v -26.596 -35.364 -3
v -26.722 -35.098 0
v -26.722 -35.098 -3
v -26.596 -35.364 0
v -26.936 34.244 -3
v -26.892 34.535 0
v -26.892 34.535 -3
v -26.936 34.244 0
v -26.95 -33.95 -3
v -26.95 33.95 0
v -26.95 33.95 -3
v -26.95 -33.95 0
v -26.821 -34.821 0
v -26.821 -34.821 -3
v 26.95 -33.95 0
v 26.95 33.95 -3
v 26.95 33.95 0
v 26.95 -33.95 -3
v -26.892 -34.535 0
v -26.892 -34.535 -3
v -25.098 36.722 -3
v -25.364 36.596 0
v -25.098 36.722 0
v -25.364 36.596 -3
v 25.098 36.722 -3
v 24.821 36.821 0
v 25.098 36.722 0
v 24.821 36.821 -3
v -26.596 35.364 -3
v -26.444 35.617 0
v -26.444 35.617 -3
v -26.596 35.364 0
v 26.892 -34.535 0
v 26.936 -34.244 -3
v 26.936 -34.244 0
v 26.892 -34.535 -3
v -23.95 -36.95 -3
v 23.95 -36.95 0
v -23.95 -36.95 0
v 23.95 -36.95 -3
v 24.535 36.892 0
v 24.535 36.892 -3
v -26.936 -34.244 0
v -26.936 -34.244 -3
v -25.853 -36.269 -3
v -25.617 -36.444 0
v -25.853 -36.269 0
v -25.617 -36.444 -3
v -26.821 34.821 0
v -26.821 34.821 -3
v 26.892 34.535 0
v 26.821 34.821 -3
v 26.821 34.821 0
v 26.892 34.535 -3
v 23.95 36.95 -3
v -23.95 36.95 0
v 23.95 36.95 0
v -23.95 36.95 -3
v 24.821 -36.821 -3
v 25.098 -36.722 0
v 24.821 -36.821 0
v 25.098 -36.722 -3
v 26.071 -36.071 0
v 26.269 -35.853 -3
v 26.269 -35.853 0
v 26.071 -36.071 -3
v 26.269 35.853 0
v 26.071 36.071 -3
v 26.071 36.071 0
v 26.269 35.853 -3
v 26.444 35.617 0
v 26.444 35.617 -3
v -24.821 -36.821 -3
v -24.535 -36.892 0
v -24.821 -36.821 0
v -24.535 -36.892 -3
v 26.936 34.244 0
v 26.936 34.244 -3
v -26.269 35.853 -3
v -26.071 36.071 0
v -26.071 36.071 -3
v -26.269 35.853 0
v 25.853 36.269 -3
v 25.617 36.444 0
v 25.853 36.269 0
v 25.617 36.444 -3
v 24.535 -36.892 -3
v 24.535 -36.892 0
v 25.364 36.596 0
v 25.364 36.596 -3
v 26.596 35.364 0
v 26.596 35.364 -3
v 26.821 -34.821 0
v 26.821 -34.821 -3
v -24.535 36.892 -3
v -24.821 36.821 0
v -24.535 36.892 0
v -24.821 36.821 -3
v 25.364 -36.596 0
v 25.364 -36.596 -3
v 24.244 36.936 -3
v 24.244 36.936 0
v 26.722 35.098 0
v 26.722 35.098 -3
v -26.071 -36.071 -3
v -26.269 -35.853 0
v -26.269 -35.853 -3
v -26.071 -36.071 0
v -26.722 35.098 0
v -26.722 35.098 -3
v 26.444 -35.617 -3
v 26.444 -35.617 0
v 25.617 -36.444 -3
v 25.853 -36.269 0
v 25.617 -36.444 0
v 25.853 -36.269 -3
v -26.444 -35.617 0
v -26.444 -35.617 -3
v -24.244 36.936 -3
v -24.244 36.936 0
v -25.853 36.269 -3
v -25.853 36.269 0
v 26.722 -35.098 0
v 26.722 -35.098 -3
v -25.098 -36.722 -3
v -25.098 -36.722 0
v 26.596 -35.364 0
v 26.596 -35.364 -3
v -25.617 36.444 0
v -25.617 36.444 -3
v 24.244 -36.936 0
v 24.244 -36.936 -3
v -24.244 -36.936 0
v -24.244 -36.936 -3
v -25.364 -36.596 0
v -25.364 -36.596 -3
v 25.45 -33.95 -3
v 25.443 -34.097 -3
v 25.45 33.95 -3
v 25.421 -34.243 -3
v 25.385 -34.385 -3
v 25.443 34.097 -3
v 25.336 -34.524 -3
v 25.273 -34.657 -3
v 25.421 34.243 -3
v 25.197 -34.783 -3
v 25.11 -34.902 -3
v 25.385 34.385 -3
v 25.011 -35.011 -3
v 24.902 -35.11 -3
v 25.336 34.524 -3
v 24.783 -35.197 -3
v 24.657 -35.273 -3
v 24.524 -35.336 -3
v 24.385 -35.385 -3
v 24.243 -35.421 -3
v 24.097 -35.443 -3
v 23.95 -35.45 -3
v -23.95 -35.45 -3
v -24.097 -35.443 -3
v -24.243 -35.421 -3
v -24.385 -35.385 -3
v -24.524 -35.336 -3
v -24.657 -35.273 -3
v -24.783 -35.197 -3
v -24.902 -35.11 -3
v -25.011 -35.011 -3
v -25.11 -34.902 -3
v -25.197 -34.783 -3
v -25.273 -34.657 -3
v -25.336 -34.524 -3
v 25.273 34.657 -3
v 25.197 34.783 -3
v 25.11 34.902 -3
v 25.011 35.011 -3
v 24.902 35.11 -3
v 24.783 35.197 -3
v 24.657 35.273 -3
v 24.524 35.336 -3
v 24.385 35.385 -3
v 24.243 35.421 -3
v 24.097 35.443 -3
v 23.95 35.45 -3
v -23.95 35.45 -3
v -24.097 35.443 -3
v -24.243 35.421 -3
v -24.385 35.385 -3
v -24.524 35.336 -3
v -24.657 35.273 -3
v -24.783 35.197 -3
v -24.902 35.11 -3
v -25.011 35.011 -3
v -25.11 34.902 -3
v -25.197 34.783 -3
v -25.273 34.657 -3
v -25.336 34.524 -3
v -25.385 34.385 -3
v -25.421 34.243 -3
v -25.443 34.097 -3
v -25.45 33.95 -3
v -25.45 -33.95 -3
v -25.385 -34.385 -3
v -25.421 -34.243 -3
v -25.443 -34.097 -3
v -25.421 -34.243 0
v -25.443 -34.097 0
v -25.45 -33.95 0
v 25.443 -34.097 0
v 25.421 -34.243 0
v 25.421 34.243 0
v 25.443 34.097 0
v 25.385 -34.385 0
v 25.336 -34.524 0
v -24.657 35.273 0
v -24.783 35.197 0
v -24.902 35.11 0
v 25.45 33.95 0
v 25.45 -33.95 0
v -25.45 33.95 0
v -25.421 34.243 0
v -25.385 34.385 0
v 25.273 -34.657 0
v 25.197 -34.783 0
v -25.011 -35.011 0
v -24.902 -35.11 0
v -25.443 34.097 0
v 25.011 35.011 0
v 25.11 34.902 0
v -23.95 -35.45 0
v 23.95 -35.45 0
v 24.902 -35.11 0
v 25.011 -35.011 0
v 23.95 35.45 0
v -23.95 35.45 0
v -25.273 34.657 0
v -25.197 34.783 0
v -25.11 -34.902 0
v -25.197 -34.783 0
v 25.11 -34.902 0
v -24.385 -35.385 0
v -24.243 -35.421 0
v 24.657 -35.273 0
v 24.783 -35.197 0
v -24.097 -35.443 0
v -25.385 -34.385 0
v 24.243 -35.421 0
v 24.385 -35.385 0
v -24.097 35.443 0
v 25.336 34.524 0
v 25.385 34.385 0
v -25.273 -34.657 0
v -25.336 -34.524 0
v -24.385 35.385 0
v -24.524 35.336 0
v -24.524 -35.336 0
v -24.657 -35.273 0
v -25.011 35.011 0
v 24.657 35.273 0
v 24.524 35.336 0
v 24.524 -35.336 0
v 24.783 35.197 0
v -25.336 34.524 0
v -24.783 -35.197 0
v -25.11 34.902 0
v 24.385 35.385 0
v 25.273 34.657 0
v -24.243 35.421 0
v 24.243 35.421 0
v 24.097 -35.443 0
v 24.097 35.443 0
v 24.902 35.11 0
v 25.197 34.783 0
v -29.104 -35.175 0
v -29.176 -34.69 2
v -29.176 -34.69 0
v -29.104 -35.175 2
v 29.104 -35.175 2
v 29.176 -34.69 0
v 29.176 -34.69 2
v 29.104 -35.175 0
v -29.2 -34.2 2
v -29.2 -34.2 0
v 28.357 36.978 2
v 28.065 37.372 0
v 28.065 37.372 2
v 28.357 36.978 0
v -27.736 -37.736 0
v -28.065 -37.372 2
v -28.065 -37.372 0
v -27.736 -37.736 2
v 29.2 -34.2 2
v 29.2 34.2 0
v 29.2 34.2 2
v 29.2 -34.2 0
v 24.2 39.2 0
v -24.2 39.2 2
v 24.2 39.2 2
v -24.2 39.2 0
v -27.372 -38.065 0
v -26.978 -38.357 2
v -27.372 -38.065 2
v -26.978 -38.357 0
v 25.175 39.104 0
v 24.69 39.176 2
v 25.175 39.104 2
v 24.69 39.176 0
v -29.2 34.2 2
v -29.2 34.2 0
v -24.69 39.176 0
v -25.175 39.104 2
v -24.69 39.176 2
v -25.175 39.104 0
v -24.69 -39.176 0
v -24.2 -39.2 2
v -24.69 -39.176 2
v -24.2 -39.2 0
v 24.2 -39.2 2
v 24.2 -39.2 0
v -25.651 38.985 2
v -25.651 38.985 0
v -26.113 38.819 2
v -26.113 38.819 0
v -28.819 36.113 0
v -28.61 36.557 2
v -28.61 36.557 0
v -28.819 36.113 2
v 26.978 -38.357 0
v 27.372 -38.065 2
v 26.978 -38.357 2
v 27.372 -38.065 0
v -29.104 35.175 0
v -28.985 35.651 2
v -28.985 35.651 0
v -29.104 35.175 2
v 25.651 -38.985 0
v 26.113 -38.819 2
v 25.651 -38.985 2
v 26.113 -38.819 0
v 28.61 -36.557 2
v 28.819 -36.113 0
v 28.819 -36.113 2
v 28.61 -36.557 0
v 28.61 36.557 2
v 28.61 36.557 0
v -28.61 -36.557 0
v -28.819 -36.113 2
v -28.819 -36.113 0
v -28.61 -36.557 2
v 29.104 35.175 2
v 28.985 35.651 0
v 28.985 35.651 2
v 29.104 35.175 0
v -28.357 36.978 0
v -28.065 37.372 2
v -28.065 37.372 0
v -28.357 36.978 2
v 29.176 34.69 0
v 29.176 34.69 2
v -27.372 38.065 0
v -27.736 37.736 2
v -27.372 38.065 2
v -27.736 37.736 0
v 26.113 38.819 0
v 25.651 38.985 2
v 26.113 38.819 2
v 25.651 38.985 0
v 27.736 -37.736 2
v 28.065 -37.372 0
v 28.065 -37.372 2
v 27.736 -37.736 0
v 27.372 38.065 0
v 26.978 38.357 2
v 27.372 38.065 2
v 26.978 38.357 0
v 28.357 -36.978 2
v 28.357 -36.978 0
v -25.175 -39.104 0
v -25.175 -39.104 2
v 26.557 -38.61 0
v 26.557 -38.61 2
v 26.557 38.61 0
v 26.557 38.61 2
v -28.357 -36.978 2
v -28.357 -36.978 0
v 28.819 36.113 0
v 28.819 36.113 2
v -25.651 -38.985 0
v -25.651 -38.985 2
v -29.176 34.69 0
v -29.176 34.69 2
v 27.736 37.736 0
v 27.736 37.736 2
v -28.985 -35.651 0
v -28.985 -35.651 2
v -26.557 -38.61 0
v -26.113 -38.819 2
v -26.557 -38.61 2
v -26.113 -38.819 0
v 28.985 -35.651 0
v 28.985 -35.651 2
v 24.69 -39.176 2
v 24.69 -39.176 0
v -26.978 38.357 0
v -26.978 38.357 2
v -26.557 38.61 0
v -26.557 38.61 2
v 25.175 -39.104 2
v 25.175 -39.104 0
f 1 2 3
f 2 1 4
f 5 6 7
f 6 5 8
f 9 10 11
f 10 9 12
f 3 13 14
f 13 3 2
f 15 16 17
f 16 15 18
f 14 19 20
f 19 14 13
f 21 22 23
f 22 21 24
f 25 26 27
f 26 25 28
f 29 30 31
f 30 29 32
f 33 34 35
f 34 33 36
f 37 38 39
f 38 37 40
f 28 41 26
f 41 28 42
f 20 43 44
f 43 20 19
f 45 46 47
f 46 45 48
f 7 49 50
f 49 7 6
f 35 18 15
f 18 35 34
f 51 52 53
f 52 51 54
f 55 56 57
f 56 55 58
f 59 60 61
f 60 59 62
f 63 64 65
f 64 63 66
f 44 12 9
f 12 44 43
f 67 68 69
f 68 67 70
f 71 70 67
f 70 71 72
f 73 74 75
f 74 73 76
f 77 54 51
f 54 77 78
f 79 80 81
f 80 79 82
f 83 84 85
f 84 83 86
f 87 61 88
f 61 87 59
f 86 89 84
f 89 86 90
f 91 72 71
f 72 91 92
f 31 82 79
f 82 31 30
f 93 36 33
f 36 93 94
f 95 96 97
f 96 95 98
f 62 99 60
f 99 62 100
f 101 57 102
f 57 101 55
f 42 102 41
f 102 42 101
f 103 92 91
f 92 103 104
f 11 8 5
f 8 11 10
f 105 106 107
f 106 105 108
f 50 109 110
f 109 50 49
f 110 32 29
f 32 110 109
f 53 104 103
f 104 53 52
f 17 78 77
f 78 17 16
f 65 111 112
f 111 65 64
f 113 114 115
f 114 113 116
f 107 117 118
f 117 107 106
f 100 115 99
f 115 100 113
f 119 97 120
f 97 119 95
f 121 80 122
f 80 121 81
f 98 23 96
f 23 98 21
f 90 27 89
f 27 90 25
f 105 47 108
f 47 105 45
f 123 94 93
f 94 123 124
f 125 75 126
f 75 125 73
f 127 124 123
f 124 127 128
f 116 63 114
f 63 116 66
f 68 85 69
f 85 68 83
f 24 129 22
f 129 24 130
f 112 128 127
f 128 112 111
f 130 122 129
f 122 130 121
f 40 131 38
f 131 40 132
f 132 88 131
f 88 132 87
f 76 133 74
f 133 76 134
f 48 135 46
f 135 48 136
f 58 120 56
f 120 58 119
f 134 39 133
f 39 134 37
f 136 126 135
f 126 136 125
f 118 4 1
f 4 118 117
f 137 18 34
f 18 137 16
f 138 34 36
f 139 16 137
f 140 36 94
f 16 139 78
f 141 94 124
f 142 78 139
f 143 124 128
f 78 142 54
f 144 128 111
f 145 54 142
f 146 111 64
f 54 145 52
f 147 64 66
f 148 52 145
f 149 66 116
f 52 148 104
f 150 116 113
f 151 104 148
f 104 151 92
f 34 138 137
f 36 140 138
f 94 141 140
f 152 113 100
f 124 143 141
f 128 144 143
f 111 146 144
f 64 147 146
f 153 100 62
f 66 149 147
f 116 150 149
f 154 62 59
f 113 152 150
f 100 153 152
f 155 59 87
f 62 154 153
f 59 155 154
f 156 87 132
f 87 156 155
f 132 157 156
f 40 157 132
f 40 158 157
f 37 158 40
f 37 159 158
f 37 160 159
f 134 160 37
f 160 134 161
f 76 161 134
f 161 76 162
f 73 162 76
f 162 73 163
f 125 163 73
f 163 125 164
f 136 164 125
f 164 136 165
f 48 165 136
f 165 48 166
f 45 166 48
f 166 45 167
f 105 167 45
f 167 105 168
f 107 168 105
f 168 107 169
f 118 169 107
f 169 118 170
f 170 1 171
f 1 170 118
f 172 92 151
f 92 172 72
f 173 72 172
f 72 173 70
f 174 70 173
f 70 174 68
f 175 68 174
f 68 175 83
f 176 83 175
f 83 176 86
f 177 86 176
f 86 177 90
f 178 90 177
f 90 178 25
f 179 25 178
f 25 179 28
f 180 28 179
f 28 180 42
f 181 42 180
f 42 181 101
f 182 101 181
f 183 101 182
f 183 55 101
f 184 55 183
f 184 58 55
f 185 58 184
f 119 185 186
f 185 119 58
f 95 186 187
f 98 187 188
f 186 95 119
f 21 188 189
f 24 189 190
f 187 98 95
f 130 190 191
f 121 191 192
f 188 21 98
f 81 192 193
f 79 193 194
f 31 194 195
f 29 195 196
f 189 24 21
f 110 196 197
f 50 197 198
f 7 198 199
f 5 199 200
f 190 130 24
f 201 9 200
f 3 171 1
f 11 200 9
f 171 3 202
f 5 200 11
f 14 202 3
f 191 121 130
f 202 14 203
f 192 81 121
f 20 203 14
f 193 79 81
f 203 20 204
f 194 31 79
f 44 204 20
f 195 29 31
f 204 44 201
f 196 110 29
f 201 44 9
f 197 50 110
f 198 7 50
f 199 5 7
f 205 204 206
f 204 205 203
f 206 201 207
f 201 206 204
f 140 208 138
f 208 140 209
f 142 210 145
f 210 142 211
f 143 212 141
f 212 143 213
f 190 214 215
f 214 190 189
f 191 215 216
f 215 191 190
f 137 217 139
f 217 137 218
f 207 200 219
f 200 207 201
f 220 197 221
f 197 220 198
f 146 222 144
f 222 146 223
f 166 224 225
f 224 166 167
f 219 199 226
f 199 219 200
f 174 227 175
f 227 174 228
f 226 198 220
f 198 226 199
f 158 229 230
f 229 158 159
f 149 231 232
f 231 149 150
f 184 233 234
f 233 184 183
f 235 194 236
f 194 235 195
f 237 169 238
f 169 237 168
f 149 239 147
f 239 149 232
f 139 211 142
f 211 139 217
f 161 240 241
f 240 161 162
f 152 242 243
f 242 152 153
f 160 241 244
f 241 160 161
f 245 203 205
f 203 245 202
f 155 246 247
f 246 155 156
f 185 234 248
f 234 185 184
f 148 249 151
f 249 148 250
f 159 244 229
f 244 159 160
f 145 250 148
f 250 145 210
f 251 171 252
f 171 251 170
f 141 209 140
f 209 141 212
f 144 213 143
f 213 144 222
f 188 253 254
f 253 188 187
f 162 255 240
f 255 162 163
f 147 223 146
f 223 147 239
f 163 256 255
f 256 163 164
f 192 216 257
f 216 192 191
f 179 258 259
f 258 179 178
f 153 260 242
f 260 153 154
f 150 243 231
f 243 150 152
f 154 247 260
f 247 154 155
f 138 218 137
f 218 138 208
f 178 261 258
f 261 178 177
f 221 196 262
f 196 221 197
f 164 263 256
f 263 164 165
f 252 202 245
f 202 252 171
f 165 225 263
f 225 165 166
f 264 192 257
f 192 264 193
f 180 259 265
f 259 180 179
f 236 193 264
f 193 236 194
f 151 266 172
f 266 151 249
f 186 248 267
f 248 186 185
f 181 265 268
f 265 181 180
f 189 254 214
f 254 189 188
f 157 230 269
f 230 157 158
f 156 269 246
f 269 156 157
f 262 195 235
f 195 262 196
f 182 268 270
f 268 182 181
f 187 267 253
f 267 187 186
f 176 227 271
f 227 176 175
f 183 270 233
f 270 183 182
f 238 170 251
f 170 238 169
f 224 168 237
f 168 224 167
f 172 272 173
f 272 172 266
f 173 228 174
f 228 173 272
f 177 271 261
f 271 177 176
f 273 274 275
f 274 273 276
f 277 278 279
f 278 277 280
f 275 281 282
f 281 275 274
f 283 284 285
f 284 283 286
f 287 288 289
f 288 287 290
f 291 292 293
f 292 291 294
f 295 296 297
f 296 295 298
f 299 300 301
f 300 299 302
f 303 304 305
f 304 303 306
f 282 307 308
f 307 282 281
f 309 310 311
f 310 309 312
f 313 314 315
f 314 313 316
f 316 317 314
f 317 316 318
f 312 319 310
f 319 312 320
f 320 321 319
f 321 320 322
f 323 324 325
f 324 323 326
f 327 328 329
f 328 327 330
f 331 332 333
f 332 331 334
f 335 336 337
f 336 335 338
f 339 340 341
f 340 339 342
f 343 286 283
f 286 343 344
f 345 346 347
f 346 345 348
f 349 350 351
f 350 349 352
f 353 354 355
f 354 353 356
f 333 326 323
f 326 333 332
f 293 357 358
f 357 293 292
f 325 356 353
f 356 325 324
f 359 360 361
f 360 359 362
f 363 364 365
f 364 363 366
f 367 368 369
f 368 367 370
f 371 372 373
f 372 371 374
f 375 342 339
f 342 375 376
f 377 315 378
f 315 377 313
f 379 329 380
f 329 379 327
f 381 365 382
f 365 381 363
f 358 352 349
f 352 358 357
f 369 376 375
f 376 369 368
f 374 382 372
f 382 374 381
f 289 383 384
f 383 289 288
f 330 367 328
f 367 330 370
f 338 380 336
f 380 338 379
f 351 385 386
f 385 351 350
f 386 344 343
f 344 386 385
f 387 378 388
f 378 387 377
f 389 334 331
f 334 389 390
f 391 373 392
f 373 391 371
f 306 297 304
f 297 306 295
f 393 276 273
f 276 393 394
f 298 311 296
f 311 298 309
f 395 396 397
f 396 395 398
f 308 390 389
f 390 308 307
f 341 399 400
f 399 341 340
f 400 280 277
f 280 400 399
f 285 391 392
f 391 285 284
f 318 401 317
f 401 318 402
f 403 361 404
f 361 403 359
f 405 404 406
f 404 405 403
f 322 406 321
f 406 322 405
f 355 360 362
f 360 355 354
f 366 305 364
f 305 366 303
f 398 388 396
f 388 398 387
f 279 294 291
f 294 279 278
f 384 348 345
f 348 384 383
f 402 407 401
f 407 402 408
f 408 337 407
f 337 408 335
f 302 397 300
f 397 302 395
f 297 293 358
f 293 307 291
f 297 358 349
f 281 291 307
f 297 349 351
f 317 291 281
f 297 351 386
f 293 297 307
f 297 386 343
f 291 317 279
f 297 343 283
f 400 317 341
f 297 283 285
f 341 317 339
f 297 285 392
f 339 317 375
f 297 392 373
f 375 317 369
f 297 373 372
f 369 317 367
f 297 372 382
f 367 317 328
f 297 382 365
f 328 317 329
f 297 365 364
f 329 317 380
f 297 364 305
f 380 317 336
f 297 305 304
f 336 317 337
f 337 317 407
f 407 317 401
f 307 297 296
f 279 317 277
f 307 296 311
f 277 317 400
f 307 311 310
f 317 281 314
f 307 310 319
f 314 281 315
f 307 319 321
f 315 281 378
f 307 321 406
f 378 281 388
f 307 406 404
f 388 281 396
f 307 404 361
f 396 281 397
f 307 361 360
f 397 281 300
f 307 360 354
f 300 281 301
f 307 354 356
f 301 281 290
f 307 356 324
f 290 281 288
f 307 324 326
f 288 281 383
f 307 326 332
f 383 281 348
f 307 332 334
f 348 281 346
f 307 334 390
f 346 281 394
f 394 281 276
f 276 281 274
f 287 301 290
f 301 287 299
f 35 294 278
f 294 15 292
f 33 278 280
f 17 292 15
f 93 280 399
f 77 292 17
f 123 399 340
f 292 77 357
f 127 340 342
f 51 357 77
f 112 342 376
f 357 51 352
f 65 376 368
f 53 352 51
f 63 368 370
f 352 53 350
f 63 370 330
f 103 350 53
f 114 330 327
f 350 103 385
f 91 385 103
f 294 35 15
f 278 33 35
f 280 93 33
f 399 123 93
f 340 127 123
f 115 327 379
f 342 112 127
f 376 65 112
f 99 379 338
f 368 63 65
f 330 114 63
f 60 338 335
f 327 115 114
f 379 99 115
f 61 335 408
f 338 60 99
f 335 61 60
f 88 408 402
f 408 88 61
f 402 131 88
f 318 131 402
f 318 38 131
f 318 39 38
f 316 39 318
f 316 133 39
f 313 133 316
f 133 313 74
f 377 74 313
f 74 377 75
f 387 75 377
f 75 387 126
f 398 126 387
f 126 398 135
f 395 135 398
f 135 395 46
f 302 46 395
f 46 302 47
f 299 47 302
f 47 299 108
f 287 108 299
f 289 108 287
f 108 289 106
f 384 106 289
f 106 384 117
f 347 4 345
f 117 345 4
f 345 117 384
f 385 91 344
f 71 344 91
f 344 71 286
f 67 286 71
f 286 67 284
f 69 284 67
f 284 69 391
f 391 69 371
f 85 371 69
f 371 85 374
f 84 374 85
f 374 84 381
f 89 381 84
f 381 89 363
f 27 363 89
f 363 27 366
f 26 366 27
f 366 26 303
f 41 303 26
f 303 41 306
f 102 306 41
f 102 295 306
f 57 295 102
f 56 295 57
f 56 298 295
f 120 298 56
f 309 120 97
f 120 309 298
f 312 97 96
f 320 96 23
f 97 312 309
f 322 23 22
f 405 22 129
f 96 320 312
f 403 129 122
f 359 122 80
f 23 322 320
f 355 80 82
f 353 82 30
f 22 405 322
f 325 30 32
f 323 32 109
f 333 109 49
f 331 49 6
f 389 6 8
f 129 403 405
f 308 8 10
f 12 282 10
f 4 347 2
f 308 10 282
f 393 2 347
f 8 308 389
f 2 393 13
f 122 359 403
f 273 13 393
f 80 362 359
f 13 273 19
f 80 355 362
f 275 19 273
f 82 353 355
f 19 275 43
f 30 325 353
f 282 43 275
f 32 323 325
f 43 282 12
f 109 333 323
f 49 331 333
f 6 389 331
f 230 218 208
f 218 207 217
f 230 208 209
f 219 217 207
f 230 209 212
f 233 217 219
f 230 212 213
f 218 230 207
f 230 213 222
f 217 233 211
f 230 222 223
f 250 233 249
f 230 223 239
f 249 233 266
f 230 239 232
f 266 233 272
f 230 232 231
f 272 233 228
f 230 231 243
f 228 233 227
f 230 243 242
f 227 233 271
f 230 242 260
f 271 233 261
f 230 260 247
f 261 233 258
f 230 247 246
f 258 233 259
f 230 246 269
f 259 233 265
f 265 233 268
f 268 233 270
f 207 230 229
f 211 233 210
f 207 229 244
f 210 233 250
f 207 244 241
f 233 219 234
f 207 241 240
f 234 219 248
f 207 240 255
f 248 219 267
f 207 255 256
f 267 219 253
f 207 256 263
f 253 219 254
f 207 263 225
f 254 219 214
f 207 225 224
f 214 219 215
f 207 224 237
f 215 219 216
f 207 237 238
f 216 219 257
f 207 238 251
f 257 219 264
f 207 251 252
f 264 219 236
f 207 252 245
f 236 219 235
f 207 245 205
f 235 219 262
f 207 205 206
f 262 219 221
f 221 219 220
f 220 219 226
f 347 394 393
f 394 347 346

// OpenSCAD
// file: example_config.scad
// ============================================================
//  example_config.scad — constants for the starter enclosure.
//
//  `include`d (not `use`d) by the pieces, so these are plain variables.
//  No geometry here, and no self-preview: an `include` would leak it into
//  every importer.
//
//  Every constant carries its provenance: MEASURED = verified with calipers
//  against the real part; ADJUST = an estimate, to be confirmed. Flip the tag
//  in place when the measurement arrives, and never delete the trail.
// ============================================================

// ---- the board this box houses ---------------------------------------------
// The defaults of the pcb_holder component: a generic 50 × 70 board. Swap these
// for your own and everything below follows.
BOX_PCB_W = 50;   // ADJUST: PCB width  (X, mm)
BOX_PCB_L = 70;   // ADJUST: PCB length (Y, mm)
BOX_PCB_T = 1.5;  // ADJUST: PCB thickness (mm)

// ---- what the component reserves around the board --------------------------
// pcb_holder puts an L-shaped wall of PCBH_WALL outside each PCB corner, with
// PCBH_FIT of play per side. The cavity has to clear both, or the holders would
// not fit inside their own box.
BOX_FIT         = 0.2;  // ADJUST: XY play between PCB edge and holder (per side) = PCBH_FIT
BOX_HOLDER_WALL = 2;    // ADJUST: holder outer wall = PCBH_WALL
BOX_HOLDER_H    = 5.0;  // ADJUST: total holder height, = pcb_holder_height() with the
                        // component defaults (standoff 2 + ref PCB 1.6 + slot 0.2 + lip 1.2).
                        // Mirrored here, so revisit it if the component's defaults move.

// ---- the enclosure ---------------------------------------------------------
BOX_WALL     = 2;    // ADJUST: outer wall thickness (mm)
BOX_FLOOR    = 2;    // ADJUST: floor thickness (mm)
BOX_HEADROOM = 12;   // ADJUST: free height above the holder lip, for tall components
BOX_CORNER_R = 3;    // ADJUST: inner corner radius in plan (mm)

// ---- the lid ---------------------------------------------------------------
BOX_LID_T   = 2;     // ADJUST: lid plate thickness (mm)
BOX_LIP_H   = 3;     // ADJUST: depth the lid lip plugs into the cavity (mm)
BOX_LIP_T   = 1.5;   // ADJUST: wall thickness of that lip — it is a rim, not a slab
BOX_LID_CL  = 0.25;  // ADJUST: play of that lip against the cavity wall (per side)

BOX_EPS = 0.05;      // local manifold fudge: overhang for cutters, overlap for unions

// ---- derived (functions, so `use` can read them from another file) ----------
// Cavity = board + the component's own footprint. Everything else hangs off this.
function box_cav_w() = BOX_PCB_W + 2 * (BOX_FIT + BOX_HOLDER_WALL);
function box_cav_l() = BOX_PCB_L + 2 * (BOX_FIT + BOX_HOLDER_WALL);
function box_cav_h() = BOX_HOLDER_H + BOX_HEADROOM;

function box_outer_w() = box_cav_w() + 2 * BOX_WALL;
function box_outer_l() = box_cav_l() + 2 * BOX_WALL;

// z of the rim the lid lands on (top of the base walls).
function box_rim_z() = BOX_FLOOR + box_cav_h();
// main file
// ============================================================
//  lid.scad — the cover of the starter enclosure: a plate with a lip that
//  plugs into the cavity and keeps it located.
//
//  Frame: XY centred like the base, and z = 0 at the MATING PLANE (the rim of
//  the base). The plate grows upward, the lip hangs downward — so in the
//  assembly it is just `translate([0, 0, box_rim_z()]) lid()`.
//  Piece, not a front door: it does NOT set $fn — main.scad does.
// ============================================================

use <../../../lib/rounded.scad>
include <example_config.scad>

module lid() {
    // The plate: same footprint as the box, so the outside is flush.
    translate([0, 0, BOX_LID_T / 2])
        rounded_flat_cube(box_outer_w(), box_outer_l(), BOX_LID_T,
                          BOX_CORNER_R + BOX_WALL);

    // The lip that enters the cavity, minus its clearance per side. It is a RIM,
    // not a slab: a solid plug would fill the box with plastic and leave no room
    // for anything standing on the board. It overlaps the plate by BOX_EPS —
    // a union of merely touching solids is a zero-thickness contact.
    lip_w = box_cav_w() - 2 * BOX_LID_CL;
    lip_l = box_cav_l() - 2 * BOX_LID_CL;
    translate([0, 0, -(BOX_LIP_H - BOX_EPS) / 2])
        difference() {
            rounded_flat_cube(lip_w, lip_l, BOX_LIP_H + BOX_EPS, BOX_CORNER_R);
            // Hollow it out. The cutter pokes past both ends so neither face is
            // left coplanar with the rim's.
            rounded_flat_cube(lip_w - 2 * BOX_LIP_T, lip_l - 2 * BOX_LIP_T,
                              BOX_LIP_H + BOX_EPS + 2 * BOX_EPS,
                              max(BOX_CORNER_R - BOX_LIP_T, 0.1));
        }
}

// ---------- Self-preview (top-level; `use <...>` ignores it) ----------
$fn = 64;
lid();
